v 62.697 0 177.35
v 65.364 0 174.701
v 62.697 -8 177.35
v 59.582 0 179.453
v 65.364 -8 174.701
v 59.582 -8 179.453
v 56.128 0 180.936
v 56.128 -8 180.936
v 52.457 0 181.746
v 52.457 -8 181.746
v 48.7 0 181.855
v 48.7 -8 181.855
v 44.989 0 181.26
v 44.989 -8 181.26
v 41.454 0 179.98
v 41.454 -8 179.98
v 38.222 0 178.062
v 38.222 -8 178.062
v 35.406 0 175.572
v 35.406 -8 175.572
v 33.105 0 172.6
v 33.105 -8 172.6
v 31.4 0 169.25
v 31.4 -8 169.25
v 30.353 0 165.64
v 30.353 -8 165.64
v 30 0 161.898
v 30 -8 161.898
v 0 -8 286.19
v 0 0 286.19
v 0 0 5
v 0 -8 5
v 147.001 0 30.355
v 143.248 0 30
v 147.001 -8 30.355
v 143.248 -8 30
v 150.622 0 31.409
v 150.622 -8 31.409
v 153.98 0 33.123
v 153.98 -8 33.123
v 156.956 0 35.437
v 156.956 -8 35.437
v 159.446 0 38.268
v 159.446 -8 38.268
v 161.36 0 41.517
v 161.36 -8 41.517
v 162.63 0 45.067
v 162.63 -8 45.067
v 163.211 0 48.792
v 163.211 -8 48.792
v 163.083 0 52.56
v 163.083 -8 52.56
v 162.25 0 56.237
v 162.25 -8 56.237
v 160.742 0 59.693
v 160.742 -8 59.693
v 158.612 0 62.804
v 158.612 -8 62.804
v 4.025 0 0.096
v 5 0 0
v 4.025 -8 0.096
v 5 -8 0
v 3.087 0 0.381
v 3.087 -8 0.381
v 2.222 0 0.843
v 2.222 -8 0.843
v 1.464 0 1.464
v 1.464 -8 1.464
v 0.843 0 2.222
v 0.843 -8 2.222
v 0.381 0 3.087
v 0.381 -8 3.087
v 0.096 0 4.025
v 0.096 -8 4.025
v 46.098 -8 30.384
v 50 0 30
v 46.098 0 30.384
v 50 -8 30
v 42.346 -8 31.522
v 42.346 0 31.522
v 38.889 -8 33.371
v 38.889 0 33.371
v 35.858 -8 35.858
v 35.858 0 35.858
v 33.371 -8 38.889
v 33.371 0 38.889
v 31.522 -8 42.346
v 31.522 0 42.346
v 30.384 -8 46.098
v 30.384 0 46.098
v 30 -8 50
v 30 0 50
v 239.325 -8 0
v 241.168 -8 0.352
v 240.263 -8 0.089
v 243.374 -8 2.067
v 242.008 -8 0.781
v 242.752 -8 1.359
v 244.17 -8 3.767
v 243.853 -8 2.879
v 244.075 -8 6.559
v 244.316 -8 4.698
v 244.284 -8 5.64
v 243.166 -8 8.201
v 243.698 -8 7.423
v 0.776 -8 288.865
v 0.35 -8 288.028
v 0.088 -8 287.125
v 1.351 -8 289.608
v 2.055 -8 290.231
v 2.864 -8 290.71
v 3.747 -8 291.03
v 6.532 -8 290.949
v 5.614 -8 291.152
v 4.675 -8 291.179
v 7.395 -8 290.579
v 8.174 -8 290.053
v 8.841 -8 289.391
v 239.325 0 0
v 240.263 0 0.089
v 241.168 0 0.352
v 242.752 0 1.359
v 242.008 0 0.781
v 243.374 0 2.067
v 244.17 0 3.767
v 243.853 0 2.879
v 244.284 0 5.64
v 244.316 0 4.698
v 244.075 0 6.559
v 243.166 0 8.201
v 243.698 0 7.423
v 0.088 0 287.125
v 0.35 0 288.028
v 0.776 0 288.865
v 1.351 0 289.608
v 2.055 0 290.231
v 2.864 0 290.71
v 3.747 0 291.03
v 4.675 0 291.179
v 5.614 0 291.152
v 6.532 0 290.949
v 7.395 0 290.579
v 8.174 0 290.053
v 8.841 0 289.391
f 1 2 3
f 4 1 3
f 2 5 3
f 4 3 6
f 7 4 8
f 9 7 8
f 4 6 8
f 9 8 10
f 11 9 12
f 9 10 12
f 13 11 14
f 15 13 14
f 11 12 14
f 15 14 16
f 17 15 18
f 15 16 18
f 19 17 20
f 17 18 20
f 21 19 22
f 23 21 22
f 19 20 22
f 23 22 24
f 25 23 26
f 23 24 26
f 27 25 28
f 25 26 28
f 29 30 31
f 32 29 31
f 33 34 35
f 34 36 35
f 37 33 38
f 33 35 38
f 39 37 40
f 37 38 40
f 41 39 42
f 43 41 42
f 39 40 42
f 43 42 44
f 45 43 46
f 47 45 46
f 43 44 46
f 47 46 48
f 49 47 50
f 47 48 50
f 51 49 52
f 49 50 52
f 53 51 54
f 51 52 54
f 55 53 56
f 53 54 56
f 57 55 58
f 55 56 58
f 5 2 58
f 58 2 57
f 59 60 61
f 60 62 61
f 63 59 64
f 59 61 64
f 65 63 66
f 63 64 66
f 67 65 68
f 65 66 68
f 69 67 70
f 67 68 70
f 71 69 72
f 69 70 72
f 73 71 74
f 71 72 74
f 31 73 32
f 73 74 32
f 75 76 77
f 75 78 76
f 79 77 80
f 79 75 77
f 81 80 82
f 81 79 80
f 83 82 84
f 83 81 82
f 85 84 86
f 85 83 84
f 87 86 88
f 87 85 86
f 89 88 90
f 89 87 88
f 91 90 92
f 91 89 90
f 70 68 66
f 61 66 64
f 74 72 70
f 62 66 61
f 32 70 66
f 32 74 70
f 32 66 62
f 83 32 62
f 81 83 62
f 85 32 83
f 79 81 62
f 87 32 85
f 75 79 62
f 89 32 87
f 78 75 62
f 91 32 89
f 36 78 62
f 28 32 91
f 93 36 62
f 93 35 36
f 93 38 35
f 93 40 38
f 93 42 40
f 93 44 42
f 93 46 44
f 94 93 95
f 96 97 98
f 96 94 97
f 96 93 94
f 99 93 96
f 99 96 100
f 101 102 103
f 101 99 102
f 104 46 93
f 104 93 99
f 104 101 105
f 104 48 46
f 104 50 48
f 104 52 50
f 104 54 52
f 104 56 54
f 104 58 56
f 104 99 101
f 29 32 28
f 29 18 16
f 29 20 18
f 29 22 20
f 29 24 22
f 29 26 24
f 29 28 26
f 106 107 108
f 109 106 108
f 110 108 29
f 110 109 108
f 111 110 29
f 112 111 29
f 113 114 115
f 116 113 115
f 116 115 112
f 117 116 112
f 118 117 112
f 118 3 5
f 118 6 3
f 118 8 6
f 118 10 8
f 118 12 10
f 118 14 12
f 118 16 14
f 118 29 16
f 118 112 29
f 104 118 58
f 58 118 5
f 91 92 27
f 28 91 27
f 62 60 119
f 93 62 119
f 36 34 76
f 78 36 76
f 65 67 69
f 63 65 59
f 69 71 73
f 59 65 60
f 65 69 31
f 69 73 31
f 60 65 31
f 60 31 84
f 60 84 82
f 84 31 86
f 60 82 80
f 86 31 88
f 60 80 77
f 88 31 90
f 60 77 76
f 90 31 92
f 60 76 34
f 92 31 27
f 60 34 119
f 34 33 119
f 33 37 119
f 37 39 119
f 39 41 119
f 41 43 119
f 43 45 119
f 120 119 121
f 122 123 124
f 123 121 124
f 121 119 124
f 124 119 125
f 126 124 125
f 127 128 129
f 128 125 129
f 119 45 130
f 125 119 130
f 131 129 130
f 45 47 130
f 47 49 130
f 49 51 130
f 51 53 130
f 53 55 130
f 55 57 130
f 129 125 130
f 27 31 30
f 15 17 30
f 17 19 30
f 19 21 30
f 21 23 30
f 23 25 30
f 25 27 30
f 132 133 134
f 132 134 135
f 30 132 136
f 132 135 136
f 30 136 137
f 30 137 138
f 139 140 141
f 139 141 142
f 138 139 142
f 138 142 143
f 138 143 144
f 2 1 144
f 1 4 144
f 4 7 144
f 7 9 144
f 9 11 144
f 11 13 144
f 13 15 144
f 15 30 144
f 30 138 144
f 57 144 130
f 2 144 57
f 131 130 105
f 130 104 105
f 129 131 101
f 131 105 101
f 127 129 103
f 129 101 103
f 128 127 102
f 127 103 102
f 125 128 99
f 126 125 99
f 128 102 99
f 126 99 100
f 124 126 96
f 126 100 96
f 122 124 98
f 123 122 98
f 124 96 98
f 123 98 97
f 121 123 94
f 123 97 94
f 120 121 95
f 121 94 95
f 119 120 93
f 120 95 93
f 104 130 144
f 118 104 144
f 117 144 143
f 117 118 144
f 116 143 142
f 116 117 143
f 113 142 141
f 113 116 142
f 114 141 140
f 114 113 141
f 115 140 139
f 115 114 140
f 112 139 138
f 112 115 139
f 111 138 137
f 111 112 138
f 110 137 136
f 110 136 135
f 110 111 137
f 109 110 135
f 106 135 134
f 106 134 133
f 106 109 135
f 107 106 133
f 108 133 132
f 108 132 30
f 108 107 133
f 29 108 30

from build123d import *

# Parameters (mm, degrees)
F1_DEPTH = 8
F2_R     = 20
F3_R     = 5


with BuildPart() as f1:
    # F0 (on Front) → F1 (new body)
    with BuildSketch(Plane.XZ):
        Polygon((250, 0), (0, 300), (0, 0), align=None)
        Polygon((30, 30), (30, 217.138502), (185.948752, 30), align=None, mode=Mode.SUBTRACT)
    extrude(amount=F1_DEPTH)

    # F2
    f2_edges = [f1.edges().sort_by_distance(p)[0] for p in [
        (30, -4, 30),
        (185.948752, -4, 30),
        (30, -4, 217.138502),
    ]]
    fillet(f2_edges, radius=F2_R)

    # F3
    f3_edges = [f1.edges().sort_by_distance(p)[0] for p in [
        (250, -4, 0),
        (0, -4, 300),
        (0, -4, 0),
    ]]
    fillet(f3_edges, radius=F3_R)


solid = f1.part
